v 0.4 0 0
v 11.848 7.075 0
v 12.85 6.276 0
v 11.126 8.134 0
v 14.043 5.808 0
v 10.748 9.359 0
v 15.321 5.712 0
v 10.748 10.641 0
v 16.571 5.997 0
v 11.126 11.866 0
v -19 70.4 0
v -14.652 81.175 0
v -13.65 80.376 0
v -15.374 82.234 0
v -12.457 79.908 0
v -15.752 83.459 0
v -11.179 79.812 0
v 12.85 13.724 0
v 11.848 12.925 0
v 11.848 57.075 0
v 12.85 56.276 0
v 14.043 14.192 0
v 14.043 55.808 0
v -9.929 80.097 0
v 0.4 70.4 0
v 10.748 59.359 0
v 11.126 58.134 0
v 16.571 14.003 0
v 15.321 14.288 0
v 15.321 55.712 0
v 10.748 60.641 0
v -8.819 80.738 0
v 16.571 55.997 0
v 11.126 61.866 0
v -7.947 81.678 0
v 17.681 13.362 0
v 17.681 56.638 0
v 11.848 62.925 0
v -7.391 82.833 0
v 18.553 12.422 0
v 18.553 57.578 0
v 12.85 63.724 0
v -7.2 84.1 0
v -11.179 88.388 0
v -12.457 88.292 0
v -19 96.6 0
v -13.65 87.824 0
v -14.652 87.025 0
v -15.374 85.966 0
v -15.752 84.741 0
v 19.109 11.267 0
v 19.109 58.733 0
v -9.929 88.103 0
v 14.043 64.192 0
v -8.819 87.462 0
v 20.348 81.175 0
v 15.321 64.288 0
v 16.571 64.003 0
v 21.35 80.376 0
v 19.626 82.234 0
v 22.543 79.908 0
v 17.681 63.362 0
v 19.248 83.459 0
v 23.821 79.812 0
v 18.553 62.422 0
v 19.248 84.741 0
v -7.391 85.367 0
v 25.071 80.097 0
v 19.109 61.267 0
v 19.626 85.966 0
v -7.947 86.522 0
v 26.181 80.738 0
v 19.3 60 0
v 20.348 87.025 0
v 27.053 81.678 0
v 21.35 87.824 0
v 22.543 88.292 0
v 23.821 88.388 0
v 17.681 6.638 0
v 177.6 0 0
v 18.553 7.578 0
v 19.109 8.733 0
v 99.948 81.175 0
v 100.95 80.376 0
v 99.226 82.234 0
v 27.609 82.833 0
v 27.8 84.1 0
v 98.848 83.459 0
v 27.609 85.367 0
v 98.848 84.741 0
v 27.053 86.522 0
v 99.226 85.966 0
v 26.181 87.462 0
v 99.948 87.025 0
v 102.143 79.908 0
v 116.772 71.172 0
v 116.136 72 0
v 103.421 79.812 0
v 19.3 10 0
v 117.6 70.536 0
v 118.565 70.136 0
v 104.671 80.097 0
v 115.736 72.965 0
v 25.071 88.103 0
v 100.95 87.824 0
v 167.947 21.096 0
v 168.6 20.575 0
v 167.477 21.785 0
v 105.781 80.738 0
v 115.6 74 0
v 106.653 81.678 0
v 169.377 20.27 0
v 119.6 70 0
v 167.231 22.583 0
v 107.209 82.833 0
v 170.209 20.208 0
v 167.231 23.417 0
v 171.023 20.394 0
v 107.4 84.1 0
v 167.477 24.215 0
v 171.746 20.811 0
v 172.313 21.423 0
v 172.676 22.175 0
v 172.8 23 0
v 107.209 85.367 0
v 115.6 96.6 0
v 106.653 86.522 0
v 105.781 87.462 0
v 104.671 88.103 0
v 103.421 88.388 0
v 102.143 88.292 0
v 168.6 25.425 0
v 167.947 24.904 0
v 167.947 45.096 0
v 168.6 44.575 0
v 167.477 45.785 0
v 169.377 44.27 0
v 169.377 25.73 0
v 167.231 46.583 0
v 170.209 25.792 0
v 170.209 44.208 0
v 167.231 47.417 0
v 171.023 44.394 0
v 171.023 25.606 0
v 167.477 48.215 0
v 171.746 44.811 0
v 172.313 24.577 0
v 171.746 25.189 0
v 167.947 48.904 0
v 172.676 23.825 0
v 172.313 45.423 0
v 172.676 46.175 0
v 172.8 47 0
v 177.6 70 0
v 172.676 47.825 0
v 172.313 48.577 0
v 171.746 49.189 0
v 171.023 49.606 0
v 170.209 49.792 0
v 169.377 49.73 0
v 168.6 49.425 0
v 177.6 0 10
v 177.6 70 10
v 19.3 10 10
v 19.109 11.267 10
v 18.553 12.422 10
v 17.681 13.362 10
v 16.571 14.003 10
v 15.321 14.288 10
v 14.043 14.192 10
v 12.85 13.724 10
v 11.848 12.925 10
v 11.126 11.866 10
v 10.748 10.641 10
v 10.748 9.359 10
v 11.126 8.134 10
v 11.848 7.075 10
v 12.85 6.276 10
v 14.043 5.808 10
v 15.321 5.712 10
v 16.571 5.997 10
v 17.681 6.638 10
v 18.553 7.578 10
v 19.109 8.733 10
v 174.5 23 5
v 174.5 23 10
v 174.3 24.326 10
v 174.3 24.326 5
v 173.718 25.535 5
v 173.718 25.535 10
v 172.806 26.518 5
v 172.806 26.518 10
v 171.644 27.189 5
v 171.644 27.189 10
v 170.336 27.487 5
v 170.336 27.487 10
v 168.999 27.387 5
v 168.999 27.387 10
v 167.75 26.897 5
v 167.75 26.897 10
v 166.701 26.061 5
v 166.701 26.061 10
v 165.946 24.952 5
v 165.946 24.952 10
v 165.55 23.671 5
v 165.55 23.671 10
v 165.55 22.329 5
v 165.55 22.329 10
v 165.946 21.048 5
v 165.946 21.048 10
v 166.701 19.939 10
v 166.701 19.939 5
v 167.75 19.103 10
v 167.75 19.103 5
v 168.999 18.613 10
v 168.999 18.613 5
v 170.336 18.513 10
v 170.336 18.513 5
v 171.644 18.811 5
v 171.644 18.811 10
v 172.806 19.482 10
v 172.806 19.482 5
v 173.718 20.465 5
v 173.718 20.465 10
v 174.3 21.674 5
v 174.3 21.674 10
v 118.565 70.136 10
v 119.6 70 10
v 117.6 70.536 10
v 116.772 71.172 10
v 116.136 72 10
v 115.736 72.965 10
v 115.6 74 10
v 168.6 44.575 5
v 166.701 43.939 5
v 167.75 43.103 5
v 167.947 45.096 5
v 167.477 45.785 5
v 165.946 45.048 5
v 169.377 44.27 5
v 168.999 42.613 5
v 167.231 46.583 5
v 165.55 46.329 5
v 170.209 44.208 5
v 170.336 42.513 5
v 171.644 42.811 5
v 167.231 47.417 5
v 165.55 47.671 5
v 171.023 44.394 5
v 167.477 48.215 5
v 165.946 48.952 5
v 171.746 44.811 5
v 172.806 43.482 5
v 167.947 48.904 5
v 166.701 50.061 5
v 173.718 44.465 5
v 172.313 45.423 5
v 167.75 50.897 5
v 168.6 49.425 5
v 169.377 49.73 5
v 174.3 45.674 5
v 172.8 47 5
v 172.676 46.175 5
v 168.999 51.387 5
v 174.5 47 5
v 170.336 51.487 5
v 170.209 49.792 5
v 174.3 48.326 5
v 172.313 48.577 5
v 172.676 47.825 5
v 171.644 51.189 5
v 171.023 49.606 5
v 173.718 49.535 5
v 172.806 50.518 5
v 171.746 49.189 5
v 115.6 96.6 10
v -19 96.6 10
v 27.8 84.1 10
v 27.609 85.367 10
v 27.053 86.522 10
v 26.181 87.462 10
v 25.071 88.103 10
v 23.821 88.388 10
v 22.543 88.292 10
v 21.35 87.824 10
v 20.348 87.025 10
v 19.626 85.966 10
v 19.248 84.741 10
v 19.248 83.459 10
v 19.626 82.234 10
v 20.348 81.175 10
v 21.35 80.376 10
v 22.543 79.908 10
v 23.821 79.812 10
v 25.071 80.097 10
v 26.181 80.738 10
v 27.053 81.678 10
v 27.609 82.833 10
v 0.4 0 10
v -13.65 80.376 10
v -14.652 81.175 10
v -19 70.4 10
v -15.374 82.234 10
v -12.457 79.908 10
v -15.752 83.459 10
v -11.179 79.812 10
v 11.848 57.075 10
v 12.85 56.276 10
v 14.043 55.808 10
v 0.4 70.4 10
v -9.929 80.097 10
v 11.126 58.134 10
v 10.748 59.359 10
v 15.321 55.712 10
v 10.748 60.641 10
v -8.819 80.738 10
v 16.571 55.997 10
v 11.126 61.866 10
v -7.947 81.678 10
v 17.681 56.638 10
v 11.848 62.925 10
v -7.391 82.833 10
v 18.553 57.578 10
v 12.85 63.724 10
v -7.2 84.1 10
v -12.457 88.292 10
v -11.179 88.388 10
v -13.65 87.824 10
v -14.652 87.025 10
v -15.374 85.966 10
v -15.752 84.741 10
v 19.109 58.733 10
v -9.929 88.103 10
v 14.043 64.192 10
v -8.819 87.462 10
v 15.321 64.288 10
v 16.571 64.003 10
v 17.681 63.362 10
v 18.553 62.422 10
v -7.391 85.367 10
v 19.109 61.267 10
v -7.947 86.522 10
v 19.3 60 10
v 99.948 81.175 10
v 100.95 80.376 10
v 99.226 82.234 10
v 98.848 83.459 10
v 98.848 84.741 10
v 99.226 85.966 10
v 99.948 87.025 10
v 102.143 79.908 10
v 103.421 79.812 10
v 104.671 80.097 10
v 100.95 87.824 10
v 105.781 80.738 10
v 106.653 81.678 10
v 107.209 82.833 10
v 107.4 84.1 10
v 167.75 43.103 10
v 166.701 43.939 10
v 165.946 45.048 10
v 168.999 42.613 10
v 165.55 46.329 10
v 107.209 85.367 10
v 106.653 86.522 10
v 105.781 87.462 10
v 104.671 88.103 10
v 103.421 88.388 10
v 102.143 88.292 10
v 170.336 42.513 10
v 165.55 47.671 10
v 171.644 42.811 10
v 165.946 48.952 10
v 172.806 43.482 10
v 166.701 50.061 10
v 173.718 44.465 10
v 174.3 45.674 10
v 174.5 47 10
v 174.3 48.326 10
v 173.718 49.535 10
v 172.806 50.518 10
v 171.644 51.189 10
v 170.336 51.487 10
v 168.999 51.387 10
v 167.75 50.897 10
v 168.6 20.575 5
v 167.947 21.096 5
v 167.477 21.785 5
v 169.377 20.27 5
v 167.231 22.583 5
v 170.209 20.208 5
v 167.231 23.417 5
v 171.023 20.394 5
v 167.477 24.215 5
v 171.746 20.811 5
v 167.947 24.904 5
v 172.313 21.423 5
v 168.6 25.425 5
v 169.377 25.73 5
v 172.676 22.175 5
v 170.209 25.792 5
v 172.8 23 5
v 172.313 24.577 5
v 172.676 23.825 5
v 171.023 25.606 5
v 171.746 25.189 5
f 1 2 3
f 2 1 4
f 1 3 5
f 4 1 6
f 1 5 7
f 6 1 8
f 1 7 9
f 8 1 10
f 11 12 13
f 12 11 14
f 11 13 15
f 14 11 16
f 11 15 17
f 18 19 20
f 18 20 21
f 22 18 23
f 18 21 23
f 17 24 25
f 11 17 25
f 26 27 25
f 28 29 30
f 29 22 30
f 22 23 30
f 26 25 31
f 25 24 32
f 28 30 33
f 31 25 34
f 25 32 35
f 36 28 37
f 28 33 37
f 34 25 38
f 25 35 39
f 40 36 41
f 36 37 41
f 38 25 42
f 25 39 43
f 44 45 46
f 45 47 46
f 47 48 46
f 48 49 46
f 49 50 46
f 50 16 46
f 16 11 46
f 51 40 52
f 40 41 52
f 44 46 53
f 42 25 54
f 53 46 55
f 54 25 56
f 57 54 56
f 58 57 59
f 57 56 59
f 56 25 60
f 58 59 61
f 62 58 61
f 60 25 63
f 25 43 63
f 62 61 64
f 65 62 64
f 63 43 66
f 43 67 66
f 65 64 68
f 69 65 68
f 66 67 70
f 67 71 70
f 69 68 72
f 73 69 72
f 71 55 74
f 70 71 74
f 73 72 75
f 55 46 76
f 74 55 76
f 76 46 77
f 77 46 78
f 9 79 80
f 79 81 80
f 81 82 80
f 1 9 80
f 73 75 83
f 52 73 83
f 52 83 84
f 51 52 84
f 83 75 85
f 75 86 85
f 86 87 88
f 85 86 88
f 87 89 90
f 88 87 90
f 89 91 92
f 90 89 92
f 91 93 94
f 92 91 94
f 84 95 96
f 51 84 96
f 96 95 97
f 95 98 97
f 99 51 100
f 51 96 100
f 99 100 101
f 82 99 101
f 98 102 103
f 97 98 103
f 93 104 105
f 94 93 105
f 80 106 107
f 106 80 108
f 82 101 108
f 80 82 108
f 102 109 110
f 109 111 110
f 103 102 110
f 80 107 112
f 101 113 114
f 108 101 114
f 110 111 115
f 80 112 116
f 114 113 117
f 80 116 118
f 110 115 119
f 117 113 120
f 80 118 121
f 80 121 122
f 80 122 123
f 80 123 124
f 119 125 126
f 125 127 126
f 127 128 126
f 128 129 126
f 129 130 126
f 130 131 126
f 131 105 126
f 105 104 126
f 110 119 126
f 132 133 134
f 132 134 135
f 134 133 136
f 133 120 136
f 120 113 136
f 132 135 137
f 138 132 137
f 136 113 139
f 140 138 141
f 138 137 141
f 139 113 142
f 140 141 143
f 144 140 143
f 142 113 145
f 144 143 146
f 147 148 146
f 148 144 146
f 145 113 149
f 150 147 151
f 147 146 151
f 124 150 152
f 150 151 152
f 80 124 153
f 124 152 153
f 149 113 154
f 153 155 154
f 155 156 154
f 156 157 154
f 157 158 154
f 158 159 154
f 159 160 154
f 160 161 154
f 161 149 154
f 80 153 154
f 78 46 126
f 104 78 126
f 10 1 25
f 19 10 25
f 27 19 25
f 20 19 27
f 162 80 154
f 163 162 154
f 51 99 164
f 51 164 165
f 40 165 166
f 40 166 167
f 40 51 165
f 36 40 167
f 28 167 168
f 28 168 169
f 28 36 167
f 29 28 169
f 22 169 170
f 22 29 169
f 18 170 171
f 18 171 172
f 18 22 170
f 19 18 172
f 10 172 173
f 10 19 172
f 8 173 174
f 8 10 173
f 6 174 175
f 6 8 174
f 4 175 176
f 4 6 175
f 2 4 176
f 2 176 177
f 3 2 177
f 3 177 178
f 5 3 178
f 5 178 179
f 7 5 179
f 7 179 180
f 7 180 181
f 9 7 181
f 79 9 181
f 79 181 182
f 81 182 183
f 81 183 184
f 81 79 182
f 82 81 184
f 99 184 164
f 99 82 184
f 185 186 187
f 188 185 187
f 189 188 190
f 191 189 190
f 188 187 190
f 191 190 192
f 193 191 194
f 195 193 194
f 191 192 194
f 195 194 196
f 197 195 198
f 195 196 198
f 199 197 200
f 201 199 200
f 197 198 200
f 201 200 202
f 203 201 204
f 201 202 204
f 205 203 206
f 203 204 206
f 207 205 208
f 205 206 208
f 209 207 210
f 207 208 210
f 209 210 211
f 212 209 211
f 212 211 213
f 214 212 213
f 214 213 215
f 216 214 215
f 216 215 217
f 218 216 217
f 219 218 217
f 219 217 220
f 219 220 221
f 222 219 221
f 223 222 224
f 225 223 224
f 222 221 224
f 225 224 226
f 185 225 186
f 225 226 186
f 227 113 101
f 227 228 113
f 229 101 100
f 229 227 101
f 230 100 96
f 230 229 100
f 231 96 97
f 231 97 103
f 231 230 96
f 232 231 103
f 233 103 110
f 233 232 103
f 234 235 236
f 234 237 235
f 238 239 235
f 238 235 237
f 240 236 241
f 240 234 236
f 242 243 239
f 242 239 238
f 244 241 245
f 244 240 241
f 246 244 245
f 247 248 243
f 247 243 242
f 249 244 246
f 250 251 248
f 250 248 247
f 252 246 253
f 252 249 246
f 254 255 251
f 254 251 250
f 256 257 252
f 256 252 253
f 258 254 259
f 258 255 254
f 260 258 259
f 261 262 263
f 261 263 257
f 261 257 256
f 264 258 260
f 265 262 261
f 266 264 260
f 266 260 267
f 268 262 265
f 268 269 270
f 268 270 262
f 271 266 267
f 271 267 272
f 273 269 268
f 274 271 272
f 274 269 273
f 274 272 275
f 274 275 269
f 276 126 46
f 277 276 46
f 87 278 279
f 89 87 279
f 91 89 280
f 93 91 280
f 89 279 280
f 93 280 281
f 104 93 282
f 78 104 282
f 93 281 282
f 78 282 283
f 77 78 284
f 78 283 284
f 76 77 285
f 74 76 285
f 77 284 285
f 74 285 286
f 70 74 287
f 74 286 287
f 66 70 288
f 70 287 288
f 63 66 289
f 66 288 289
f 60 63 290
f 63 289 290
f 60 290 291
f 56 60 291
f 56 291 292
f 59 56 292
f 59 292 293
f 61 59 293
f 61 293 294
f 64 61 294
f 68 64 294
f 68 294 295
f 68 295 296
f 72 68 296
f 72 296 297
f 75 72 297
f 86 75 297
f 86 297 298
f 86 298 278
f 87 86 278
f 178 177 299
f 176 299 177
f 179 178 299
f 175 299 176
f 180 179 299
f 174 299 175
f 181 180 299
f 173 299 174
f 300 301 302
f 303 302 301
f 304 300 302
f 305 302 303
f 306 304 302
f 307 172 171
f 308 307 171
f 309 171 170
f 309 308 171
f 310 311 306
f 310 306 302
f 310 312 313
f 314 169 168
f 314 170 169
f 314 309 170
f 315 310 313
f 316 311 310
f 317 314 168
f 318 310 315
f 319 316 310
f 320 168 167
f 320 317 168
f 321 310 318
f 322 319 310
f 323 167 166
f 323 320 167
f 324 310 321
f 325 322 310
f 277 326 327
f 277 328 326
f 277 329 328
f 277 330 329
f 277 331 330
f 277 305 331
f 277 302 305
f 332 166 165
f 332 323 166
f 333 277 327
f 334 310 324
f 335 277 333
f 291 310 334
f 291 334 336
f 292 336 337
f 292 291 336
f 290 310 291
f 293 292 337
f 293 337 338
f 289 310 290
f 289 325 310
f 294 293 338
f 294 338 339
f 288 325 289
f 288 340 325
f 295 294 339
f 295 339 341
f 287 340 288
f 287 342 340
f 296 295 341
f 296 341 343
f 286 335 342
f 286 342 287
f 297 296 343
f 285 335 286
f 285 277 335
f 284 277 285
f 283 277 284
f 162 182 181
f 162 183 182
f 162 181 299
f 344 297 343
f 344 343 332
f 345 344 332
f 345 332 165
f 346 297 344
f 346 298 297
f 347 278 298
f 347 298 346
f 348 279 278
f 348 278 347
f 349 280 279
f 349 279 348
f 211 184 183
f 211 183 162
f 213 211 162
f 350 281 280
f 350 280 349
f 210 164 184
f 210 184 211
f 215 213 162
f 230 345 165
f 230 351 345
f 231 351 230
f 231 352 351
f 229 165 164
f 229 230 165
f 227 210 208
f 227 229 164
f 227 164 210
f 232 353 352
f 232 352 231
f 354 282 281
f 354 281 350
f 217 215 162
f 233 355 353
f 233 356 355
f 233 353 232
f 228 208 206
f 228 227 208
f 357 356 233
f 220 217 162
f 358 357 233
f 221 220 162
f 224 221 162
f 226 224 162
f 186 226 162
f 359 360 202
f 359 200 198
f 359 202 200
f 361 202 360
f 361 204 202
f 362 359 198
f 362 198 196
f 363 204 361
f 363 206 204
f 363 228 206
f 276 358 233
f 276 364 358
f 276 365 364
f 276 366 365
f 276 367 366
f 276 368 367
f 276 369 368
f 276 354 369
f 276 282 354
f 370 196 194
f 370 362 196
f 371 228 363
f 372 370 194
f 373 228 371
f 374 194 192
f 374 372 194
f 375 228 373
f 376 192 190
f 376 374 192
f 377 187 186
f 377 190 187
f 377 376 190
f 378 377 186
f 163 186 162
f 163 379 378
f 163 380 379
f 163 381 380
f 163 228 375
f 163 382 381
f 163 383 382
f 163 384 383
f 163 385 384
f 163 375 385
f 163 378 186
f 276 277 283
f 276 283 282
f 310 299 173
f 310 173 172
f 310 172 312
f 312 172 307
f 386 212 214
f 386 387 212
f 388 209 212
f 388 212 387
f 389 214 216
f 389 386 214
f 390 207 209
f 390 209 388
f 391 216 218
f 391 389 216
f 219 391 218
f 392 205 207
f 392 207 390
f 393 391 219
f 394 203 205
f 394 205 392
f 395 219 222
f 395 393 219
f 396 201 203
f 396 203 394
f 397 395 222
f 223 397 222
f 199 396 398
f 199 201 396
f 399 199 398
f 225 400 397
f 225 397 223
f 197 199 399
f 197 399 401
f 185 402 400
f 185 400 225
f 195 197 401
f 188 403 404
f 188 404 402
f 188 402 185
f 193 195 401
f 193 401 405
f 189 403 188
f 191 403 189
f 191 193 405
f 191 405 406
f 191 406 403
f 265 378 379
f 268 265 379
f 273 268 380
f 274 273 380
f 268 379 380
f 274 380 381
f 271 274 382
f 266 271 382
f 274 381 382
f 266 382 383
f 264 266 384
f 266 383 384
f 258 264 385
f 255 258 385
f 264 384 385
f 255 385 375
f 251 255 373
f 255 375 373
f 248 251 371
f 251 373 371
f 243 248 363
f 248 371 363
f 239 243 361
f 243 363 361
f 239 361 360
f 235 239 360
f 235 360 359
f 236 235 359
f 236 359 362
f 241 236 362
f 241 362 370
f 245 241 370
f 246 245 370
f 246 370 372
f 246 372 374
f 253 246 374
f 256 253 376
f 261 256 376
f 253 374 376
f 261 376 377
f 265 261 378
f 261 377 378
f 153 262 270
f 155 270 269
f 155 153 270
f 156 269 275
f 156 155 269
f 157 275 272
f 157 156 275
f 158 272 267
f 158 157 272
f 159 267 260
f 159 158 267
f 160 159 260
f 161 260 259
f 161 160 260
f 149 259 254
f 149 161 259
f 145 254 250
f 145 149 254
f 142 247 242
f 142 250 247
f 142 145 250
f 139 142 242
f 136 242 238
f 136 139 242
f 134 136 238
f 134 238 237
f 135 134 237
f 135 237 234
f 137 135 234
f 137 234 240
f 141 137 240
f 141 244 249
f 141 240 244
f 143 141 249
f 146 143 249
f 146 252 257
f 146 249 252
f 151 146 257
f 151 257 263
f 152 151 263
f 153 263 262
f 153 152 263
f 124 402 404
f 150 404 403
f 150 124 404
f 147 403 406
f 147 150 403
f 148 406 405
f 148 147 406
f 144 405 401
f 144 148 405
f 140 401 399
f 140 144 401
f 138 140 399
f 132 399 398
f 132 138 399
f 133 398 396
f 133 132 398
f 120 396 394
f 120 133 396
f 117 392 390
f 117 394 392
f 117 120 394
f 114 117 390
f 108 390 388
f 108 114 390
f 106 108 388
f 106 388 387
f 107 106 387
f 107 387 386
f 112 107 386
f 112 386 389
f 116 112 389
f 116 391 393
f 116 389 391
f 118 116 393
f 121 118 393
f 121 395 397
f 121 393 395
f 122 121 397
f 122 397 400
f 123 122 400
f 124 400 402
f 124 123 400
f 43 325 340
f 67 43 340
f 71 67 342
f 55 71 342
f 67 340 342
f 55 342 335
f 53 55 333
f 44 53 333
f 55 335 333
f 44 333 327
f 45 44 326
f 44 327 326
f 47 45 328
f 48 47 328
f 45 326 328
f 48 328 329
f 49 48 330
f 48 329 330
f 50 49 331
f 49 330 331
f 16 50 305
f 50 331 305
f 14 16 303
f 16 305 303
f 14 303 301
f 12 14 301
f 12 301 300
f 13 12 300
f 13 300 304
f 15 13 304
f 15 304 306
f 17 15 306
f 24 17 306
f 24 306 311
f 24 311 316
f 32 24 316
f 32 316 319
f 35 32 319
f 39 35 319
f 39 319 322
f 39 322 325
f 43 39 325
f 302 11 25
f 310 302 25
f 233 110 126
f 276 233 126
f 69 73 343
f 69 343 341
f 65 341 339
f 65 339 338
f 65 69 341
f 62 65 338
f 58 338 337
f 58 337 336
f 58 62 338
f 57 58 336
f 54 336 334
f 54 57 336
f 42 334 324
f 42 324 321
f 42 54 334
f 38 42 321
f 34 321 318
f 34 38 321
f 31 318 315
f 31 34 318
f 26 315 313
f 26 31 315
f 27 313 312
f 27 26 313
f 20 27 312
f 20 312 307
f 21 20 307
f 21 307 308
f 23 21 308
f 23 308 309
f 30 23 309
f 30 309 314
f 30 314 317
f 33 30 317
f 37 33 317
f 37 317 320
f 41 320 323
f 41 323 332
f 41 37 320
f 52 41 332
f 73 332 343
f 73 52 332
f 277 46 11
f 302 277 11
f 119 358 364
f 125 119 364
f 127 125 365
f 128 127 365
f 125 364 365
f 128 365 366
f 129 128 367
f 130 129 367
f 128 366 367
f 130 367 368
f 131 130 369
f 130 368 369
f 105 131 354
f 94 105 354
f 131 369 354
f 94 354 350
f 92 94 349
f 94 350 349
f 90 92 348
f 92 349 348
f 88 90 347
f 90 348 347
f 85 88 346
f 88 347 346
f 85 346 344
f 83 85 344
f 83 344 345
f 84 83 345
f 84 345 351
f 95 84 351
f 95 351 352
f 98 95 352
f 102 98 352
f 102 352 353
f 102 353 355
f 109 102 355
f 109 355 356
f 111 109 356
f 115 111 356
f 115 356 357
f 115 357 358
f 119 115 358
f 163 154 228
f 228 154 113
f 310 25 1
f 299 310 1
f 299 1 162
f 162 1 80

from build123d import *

# Parameters (mm, degrees)
SKETCH_R        = 4.3
SKETCH_R_2      = 2.8
PAD_DEPTH       = 10
SKETCH001_R     = 4.5
POCKET_DEPTH    = 5
FILLET_R        = 4
SKETCH002_R     = 4.3
POCKET001_DEPTH = 10.001


with BuildPart() as part:
    # Sketch → Pad (new body)
    with BuildSketch(Plane.XY):
        Polygon((0.4, 0), (177.6, 0), (177.6, 70), (115.6, 70), (115.6, 96.6), (-19, 96.6), (-19, 70.4), (0.4, 70.4), align=None)
        with Locations((15, 60)):
            Circle(SKETCH_R, mode=Mode.SUBTRACT)
        with Locations((15, 10)):
            Circle(SKETCH_R, mode=Mode.SUBTRACT)
        with Locations((170, 47)):
            Circle(SKETCH_R_2, mode=Mode.SUBTRACT)
        with Locations((170, 23)):
            Circle(SKETCH_R_2, mode=Mode.SUBTRACT)
    extrude(amount=PAD_DEPTH)

    # Sketch001 (on Face14 of Pad) → Pocket (cut)
    with BuildSketch(Plane.XY.offset(10)):
        with Locations((170, 47)):
            Circle(SKETCH001_R)
        with Locations((170, 23)):
            Circle(SKETCH001_R)
    extrude(amount=-POCKET_DEPTH, mode=Mode.SUBTRACT)

    # Fillet
    fillet_edges = [part.edges().sort_by_distance(p)[0] for p in [
        (115.6, 70, 5),
    ]]
    fillet(fillet_edges, radius=FILLET_R)

    # Sketch002 (on Face15 of Fillet) → Pocket001 (cut, through all)
    with BuildSketch(Plane.XY.offset(10)):
        with Locations((-11.5, 84.1)):
            Circle(SKETCH002_R)
        with Locations((23.5, 84.1)):
            Circle(SKETCH002_R)
        with Locations((103.1, 84.1)):
            Circle(SKETCH002_R)
    extrude(amount=-POCKET001_DEPTH, mode=Mode.SUBTRACT)


solid = part.part
